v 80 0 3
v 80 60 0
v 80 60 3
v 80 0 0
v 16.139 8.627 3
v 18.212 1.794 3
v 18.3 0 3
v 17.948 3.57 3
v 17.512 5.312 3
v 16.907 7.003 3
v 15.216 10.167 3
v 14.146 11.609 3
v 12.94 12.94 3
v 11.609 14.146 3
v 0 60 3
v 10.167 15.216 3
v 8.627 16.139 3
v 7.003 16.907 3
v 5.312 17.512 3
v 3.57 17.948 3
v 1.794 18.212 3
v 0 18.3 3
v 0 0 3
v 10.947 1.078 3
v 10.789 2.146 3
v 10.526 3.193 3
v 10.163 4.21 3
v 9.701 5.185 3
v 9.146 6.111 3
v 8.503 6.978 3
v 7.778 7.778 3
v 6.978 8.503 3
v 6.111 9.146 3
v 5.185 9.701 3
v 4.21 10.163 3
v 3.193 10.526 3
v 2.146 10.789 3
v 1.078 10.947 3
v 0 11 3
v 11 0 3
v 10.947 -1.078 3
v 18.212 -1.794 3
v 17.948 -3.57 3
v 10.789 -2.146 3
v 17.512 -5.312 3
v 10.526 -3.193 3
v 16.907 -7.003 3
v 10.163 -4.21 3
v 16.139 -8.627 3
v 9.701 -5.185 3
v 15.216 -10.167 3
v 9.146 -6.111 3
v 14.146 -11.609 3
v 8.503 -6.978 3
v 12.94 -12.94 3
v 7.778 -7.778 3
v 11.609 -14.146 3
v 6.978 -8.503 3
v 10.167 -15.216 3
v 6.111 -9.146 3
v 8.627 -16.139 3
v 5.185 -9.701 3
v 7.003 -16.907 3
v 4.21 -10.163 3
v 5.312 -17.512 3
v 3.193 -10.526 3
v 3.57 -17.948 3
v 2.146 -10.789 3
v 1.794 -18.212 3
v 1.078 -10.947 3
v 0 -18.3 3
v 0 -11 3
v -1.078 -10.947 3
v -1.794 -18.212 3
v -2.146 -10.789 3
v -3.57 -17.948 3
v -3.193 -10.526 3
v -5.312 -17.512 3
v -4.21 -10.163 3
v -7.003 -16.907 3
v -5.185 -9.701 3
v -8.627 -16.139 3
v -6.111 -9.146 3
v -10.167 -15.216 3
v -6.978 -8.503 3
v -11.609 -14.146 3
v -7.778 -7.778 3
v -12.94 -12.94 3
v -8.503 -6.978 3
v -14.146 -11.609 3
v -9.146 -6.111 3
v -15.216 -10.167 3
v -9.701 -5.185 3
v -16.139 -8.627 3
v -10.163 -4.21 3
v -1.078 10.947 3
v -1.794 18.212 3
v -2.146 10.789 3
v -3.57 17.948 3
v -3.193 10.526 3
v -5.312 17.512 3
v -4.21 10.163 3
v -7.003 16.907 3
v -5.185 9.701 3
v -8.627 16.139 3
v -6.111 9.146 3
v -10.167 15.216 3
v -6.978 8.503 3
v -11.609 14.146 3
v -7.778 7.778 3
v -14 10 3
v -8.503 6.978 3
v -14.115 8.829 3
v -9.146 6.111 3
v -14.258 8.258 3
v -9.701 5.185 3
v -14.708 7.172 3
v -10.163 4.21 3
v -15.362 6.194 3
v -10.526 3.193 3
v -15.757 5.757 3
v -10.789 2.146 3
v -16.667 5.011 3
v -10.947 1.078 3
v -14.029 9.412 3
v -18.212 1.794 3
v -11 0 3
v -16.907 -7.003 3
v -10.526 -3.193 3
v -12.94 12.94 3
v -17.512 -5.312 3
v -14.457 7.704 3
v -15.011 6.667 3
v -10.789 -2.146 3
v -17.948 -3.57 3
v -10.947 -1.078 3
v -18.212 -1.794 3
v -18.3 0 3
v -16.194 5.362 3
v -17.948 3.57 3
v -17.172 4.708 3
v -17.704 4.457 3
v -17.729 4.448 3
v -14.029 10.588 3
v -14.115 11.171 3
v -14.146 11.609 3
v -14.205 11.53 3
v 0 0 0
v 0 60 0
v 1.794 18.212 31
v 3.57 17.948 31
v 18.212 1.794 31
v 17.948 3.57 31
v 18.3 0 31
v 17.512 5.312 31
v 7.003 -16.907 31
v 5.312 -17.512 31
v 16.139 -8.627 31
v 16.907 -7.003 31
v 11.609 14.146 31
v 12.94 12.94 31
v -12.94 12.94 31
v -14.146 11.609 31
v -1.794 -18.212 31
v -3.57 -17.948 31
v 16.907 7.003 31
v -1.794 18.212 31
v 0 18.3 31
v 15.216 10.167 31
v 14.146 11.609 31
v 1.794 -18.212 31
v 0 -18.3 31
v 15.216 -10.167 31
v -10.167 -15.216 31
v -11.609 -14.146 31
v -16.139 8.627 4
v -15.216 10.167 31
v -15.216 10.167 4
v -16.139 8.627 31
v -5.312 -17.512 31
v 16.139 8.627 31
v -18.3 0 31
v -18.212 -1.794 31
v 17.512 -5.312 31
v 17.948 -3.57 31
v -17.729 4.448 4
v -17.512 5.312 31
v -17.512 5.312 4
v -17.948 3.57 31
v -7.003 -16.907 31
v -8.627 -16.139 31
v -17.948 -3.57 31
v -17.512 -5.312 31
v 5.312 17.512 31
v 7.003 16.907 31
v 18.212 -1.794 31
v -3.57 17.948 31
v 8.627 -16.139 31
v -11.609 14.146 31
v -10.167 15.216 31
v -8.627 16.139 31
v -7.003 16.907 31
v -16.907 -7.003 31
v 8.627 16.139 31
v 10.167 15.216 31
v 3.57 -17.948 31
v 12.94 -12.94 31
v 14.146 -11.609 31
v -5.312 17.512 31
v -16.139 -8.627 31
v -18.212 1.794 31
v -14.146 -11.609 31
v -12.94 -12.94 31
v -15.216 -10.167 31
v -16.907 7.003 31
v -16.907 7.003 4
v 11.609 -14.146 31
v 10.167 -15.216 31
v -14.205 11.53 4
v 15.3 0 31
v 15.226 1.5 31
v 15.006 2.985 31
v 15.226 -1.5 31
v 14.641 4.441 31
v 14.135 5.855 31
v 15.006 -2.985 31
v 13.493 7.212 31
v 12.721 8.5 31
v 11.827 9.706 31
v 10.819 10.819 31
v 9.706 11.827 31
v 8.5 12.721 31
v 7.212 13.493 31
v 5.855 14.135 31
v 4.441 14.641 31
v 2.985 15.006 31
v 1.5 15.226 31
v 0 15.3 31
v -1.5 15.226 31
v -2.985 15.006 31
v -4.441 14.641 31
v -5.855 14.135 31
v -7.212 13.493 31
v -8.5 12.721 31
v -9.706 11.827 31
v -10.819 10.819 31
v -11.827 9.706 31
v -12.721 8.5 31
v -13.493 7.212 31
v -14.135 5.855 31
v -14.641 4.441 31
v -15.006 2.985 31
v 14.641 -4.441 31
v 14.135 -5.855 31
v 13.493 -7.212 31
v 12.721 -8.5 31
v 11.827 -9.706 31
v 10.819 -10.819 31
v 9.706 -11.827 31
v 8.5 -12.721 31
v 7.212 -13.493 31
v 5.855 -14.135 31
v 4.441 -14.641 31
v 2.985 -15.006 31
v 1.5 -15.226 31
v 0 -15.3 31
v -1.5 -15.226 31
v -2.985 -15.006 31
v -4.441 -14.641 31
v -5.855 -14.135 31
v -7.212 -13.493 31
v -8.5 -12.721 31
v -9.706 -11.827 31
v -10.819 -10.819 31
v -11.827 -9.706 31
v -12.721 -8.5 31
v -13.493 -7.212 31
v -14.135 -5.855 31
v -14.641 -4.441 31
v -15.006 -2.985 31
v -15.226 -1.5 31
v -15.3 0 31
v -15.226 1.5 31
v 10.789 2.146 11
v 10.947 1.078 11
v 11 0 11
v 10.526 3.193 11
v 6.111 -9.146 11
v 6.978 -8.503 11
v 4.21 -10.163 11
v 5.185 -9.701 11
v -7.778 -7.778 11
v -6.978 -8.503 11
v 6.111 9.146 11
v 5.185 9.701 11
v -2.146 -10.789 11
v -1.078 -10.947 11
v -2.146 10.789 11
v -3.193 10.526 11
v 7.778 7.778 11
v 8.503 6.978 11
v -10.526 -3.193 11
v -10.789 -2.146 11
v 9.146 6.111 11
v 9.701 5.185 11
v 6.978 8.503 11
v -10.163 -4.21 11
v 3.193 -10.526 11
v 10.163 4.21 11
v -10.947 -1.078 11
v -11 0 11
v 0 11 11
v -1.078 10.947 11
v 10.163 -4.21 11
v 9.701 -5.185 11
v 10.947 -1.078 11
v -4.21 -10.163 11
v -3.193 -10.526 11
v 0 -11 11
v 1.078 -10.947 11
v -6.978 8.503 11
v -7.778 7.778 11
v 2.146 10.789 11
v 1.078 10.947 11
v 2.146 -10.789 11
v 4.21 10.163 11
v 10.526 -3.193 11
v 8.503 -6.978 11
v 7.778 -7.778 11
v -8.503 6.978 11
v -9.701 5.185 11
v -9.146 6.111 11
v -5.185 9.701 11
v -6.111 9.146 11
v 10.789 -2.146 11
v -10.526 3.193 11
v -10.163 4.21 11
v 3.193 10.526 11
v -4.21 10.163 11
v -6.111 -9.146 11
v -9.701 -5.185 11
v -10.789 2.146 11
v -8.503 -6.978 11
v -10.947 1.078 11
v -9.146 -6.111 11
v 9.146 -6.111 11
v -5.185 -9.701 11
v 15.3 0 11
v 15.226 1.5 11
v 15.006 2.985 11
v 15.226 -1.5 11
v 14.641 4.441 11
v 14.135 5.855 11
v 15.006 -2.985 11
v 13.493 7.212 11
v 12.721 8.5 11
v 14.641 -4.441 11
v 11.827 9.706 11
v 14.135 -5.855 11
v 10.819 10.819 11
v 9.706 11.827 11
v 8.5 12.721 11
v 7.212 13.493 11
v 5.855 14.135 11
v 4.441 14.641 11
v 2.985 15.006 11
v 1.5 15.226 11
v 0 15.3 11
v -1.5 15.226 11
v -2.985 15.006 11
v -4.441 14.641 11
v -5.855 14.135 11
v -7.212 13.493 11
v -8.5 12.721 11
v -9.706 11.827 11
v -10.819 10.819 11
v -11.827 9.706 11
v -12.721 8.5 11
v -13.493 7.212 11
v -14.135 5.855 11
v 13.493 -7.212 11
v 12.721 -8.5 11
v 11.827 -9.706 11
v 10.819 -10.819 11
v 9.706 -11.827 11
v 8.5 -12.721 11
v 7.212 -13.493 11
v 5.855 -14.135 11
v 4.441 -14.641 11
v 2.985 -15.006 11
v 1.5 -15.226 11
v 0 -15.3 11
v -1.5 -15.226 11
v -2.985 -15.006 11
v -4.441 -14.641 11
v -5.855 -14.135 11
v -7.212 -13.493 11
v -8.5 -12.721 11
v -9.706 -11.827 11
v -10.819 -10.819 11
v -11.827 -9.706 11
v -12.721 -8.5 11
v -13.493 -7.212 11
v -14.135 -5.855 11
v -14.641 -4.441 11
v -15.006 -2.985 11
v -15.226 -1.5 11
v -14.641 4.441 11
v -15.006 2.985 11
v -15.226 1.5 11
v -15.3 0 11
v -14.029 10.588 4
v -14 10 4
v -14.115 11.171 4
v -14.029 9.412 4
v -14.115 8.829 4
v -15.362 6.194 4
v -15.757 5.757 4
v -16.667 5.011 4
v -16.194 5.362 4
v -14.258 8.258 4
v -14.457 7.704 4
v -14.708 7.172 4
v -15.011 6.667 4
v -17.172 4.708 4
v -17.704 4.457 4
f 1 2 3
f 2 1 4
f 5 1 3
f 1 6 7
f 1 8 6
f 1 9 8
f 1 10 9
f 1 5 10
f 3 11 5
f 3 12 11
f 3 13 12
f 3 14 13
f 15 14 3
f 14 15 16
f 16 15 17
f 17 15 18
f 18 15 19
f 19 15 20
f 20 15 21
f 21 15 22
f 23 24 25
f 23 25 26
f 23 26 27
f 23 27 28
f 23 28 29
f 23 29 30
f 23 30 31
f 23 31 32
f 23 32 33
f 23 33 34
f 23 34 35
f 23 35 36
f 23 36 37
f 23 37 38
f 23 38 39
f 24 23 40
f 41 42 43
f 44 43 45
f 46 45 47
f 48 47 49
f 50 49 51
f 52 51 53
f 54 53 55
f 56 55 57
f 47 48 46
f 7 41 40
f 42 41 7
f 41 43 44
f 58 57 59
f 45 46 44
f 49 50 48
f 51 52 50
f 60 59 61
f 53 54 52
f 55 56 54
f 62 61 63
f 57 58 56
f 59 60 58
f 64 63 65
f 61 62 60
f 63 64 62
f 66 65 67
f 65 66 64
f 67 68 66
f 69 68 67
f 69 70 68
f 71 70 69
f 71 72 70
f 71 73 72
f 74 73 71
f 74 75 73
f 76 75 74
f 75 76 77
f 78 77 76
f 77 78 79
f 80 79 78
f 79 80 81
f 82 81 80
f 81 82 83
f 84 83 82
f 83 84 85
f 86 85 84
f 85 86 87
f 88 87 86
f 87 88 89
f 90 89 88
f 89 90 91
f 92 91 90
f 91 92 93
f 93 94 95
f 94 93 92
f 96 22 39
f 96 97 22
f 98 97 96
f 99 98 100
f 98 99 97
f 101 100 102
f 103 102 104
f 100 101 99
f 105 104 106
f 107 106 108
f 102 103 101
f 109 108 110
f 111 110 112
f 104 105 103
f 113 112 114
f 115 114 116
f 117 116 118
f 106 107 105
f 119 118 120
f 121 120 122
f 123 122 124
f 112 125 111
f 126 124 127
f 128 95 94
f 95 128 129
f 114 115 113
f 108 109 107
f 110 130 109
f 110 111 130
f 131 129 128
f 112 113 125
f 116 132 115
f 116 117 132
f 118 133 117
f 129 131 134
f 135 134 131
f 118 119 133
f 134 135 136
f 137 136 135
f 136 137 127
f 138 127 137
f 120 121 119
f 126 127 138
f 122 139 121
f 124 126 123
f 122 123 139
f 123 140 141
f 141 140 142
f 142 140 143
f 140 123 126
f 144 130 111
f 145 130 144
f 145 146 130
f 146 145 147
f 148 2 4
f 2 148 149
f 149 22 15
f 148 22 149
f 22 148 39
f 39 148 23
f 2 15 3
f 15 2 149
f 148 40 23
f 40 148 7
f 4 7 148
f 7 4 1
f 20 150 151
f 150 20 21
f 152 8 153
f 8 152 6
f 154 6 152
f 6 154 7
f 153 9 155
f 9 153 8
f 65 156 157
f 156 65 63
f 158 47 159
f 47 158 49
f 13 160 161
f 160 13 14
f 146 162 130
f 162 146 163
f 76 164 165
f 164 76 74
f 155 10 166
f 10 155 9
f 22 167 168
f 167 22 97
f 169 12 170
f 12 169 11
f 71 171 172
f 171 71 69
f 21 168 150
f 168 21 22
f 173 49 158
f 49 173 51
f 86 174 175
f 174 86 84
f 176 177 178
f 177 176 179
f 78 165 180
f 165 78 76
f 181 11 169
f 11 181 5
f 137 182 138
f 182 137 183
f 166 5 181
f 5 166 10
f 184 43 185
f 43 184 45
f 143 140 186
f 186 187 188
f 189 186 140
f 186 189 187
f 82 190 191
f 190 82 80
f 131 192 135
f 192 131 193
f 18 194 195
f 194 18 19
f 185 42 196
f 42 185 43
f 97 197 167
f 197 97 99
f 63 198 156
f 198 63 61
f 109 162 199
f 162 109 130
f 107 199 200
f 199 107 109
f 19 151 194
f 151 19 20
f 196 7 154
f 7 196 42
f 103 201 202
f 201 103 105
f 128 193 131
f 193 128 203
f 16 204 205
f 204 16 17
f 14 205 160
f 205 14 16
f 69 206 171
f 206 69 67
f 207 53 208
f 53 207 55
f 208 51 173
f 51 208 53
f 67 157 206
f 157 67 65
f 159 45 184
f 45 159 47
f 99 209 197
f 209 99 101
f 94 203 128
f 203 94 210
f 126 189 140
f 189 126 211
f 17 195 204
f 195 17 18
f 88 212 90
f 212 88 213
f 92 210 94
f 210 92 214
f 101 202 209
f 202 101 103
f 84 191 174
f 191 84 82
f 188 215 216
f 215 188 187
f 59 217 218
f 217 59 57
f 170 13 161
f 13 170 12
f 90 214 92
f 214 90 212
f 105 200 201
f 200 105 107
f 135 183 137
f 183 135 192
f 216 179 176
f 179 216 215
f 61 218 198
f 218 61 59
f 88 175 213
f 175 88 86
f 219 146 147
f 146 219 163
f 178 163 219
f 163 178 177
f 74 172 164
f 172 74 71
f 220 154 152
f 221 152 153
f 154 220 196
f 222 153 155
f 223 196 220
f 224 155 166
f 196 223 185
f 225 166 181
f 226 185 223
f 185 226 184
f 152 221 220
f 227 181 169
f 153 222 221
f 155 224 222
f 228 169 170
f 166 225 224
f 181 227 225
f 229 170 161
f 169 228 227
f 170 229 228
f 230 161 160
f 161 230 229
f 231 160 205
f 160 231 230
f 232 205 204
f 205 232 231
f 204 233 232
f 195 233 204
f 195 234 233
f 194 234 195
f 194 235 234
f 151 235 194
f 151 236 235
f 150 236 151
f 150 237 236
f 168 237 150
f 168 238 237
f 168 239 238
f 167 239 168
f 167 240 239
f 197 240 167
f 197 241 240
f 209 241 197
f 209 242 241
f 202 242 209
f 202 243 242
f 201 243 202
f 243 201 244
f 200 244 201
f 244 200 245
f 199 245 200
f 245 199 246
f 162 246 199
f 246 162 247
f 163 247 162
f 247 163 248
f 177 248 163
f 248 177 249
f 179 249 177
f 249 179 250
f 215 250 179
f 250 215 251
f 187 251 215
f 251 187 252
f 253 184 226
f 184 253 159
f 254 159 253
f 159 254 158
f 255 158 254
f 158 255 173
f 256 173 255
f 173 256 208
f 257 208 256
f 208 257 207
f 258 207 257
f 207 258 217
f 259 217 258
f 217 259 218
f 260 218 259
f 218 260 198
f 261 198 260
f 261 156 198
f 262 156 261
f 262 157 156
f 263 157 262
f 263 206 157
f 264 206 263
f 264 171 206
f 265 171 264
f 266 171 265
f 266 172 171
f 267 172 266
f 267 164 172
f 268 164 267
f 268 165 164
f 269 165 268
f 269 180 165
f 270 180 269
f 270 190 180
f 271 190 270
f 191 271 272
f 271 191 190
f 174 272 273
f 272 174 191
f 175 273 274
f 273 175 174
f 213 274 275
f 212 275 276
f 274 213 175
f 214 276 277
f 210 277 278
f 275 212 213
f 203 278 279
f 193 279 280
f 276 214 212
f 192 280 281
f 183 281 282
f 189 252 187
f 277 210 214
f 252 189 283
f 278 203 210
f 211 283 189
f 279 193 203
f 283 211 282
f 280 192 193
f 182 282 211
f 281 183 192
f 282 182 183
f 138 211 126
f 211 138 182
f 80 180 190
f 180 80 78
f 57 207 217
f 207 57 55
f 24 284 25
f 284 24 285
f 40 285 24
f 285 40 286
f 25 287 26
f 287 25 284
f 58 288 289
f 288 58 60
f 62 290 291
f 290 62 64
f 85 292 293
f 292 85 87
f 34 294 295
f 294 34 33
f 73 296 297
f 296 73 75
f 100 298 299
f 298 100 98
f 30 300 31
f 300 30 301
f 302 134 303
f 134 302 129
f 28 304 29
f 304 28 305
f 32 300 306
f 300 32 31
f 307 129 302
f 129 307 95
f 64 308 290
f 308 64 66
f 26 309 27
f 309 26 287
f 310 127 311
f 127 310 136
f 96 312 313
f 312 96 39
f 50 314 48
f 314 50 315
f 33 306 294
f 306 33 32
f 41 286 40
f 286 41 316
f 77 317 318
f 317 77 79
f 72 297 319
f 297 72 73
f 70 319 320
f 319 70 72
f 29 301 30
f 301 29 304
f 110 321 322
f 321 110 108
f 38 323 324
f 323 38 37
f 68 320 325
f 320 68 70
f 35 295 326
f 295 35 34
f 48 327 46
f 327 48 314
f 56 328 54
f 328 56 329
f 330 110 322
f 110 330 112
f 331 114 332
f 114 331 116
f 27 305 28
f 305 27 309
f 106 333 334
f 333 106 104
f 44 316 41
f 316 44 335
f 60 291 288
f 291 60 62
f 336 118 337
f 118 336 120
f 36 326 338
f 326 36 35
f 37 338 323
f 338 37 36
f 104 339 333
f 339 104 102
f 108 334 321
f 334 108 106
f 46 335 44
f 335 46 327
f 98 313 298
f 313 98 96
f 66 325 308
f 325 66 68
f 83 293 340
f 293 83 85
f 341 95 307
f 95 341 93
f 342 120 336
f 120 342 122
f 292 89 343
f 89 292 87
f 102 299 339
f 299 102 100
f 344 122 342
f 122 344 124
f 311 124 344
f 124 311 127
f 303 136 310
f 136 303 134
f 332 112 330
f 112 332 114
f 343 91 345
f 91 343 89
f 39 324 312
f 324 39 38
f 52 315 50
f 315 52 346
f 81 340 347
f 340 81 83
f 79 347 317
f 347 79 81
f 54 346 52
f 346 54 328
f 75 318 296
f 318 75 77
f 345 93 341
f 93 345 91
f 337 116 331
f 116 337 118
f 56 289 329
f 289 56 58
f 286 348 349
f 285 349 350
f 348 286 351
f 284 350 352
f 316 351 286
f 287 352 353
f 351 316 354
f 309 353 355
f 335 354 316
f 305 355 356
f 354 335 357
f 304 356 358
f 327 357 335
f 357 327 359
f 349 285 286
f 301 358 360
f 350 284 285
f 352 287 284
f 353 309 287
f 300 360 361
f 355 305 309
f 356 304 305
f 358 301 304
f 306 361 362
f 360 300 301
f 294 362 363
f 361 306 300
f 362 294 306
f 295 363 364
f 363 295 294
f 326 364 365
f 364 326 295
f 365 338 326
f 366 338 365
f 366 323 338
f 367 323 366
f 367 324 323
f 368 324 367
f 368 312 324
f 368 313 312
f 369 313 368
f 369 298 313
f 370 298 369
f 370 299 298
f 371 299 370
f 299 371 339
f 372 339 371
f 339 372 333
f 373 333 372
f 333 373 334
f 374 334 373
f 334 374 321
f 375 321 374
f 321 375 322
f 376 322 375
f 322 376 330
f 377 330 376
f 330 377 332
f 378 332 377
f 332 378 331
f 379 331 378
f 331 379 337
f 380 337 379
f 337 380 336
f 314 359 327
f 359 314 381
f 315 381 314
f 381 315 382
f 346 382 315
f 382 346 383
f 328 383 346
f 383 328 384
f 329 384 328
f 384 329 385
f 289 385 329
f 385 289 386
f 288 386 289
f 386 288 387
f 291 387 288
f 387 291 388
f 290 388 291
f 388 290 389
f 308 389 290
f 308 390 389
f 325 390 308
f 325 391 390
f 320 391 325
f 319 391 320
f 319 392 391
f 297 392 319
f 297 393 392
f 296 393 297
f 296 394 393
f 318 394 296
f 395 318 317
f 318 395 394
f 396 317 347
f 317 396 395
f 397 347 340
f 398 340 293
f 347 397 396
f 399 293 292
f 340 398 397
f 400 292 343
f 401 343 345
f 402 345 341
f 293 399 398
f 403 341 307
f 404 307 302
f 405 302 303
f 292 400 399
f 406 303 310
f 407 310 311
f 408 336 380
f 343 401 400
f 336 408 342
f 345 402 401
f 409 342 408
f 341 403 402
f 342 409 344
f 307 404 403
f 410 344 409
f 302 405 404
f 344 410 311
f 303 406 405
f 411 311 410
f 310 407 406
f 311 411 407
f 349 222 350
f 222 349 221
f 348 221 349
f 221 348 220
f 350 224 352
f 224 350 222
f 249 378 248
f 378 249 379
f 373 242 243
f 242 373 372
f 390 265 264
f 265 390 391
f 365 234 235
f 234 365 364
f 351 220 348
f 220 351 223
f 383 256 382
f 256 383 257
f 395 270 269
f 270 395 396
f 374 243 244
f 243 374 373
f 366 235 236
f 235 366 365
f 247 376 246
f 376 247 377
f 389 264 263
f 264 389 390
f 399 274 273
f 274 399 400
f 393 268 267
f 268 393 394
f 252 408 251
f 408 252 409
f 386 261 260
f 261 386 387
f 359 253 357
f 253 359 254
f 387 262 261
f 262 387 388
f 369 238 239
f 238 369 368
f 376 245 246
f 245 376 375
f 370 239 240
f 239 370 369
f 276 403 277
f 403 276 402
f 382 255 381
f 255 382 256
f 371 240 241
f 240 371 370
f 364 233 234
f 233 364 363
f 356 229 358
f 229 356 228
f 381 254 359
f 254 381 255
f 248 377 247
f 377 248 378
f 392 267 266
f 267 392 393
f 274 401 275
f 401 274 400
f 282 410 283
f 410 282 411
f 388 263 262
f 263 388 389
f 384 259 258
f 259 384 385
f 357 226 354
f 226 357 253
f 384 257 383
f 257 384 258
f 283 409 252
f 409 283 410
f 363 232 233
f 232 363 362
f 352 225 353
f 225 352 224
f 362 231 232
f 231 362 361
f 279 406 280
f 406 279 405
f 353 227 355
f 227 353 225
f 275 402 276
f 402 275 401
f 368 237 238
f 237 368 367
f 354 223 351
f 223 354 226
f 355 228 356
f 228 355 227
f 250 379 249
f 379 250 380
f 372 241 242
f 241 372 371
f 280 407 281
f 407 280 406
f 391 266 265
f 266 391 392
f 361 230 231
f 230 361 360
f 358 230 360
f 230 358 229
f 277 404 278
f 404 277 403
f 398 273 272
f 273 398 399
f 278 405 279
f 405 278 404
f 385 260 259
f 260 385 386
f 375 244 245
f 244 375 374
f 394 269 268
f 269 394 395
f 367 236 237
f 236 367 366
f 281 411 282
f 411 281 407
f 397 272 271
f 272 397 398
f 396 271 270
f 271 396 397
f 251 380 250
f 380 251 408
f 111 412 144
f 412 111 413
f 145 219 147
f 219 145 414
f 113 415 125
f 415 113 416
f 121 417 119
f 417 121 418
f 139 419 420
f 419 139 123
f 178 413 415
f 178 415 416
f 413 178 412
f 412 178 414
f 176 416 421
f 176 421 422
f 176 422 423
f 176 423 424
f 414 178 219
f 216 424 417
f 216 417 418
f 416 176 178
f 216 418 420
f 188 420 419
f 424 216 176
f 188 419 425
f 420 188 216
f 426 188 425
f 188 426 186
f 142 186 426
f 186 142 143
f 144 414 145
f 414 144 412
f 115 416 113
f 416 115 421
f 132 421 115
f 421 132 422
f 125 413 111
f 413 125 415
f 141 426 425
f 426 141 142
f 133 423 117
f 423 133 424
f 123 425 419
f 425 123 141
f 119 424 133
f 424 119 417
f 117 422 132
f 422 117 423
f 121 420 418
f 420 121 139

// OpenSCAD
// Adapter: phone camera over microscope eyepiece (30 mm OD), printed phone-side down.
// Units: mm. Rests on XY plane at z=0, centred on origin in X/Y.

// --- Dimensions (measured with calipers) ---
plate_x   = 80;   // plate length along X
plate_y   = 60;   // plate width along Y
plate_z   = 3;    // plate thickness (z = 0..3)

cam_hole_d  = 12; // camera hole diameter
cam_hole_x  = -20;// camera hole centre X
cam_hole_y  = 10; // camera hole centre Y

sleeve_od   = 36.6; // sleeve outer diameter
sleeve_z0   = 3;    // sleeve base (top of plate)
sleeve_z1   = 11;   // bore step (stop)
sleeve_ztop = 31;   // sleeve open top
bore_d_low  = 22;   // bore diameter z=3..11 (sets eyepiece distance)
bore_d_high = 30.6; // bore diameter z=11..top (slides over 30 mm eyepiece)

screw_hole_d = 2.5; // radial M3 centring-screw hole diameter
screw_z      = 21;  // screw hole height
screw_count  = 3;   // radial holes, 120 deg apart, first at +X

// --- Print orientation: plate on bed, sleeve up (+Z) ---
$fn = 64;

module plate() {
    // 80 x 60 x 3 plate centred on origin, z = 0..3
    cube([plate_x, plate_y, plate_z], center=[0,0,plate_z/2]);
}

module camera_hole() {
    // 12 mm through-hole at (-20, 10), cut 0.5 mm past top/bottom
    translate([cam_hole_x, cam_hole_y, 0])
        cylinder(h = plate_z + 1, d = cam_hole_d, $fn = $fn);
}

module sleeve() {
    // Outer sleeve: 36.6 mm OD, z = 3..31
    translate([0, 0, sleeve_z0])
        cylinder(h = sleeve_ztop - sleeve_z0, d = sleeve_od, $fn = $fn);
}

module sleeve_bores() {
    // Lower bore 22 mm, z = 3..11 (stop)
    translate([0, 0, sleeve_z0])
        cylinder(h = sleeve_z1 - sleeve_z0, d = bore_d_low, $fn = $fn);
    // Upper bore 30.6 mm, z = 11..31 (open top)
    translate([0, 0, sleeve_z1])
        cylinder(h = sleeve_ztop - sleeve_z1, d = bore_d_high, $fn = $fn);
}

module screw_holes() {
    // 3 radial 2.5 mm holes through sleeve wall at z = 21, 120 deg apart, first at +X
    for (i = [0, 1, 2]) {
        angle = i * 120;
        translate([0, 0, screw_z])
            rotate([0, 0, angle])
                cylinder(h = 2, d = screw_hole_d, $fn = $fn);
    }
}

// --- Assemble ---
union() {
    difference() {
        union() {
            plate();
            sleeve();
        }
        camera_hole();
        sleeve_bores();
        screw_holes();
    }
}
